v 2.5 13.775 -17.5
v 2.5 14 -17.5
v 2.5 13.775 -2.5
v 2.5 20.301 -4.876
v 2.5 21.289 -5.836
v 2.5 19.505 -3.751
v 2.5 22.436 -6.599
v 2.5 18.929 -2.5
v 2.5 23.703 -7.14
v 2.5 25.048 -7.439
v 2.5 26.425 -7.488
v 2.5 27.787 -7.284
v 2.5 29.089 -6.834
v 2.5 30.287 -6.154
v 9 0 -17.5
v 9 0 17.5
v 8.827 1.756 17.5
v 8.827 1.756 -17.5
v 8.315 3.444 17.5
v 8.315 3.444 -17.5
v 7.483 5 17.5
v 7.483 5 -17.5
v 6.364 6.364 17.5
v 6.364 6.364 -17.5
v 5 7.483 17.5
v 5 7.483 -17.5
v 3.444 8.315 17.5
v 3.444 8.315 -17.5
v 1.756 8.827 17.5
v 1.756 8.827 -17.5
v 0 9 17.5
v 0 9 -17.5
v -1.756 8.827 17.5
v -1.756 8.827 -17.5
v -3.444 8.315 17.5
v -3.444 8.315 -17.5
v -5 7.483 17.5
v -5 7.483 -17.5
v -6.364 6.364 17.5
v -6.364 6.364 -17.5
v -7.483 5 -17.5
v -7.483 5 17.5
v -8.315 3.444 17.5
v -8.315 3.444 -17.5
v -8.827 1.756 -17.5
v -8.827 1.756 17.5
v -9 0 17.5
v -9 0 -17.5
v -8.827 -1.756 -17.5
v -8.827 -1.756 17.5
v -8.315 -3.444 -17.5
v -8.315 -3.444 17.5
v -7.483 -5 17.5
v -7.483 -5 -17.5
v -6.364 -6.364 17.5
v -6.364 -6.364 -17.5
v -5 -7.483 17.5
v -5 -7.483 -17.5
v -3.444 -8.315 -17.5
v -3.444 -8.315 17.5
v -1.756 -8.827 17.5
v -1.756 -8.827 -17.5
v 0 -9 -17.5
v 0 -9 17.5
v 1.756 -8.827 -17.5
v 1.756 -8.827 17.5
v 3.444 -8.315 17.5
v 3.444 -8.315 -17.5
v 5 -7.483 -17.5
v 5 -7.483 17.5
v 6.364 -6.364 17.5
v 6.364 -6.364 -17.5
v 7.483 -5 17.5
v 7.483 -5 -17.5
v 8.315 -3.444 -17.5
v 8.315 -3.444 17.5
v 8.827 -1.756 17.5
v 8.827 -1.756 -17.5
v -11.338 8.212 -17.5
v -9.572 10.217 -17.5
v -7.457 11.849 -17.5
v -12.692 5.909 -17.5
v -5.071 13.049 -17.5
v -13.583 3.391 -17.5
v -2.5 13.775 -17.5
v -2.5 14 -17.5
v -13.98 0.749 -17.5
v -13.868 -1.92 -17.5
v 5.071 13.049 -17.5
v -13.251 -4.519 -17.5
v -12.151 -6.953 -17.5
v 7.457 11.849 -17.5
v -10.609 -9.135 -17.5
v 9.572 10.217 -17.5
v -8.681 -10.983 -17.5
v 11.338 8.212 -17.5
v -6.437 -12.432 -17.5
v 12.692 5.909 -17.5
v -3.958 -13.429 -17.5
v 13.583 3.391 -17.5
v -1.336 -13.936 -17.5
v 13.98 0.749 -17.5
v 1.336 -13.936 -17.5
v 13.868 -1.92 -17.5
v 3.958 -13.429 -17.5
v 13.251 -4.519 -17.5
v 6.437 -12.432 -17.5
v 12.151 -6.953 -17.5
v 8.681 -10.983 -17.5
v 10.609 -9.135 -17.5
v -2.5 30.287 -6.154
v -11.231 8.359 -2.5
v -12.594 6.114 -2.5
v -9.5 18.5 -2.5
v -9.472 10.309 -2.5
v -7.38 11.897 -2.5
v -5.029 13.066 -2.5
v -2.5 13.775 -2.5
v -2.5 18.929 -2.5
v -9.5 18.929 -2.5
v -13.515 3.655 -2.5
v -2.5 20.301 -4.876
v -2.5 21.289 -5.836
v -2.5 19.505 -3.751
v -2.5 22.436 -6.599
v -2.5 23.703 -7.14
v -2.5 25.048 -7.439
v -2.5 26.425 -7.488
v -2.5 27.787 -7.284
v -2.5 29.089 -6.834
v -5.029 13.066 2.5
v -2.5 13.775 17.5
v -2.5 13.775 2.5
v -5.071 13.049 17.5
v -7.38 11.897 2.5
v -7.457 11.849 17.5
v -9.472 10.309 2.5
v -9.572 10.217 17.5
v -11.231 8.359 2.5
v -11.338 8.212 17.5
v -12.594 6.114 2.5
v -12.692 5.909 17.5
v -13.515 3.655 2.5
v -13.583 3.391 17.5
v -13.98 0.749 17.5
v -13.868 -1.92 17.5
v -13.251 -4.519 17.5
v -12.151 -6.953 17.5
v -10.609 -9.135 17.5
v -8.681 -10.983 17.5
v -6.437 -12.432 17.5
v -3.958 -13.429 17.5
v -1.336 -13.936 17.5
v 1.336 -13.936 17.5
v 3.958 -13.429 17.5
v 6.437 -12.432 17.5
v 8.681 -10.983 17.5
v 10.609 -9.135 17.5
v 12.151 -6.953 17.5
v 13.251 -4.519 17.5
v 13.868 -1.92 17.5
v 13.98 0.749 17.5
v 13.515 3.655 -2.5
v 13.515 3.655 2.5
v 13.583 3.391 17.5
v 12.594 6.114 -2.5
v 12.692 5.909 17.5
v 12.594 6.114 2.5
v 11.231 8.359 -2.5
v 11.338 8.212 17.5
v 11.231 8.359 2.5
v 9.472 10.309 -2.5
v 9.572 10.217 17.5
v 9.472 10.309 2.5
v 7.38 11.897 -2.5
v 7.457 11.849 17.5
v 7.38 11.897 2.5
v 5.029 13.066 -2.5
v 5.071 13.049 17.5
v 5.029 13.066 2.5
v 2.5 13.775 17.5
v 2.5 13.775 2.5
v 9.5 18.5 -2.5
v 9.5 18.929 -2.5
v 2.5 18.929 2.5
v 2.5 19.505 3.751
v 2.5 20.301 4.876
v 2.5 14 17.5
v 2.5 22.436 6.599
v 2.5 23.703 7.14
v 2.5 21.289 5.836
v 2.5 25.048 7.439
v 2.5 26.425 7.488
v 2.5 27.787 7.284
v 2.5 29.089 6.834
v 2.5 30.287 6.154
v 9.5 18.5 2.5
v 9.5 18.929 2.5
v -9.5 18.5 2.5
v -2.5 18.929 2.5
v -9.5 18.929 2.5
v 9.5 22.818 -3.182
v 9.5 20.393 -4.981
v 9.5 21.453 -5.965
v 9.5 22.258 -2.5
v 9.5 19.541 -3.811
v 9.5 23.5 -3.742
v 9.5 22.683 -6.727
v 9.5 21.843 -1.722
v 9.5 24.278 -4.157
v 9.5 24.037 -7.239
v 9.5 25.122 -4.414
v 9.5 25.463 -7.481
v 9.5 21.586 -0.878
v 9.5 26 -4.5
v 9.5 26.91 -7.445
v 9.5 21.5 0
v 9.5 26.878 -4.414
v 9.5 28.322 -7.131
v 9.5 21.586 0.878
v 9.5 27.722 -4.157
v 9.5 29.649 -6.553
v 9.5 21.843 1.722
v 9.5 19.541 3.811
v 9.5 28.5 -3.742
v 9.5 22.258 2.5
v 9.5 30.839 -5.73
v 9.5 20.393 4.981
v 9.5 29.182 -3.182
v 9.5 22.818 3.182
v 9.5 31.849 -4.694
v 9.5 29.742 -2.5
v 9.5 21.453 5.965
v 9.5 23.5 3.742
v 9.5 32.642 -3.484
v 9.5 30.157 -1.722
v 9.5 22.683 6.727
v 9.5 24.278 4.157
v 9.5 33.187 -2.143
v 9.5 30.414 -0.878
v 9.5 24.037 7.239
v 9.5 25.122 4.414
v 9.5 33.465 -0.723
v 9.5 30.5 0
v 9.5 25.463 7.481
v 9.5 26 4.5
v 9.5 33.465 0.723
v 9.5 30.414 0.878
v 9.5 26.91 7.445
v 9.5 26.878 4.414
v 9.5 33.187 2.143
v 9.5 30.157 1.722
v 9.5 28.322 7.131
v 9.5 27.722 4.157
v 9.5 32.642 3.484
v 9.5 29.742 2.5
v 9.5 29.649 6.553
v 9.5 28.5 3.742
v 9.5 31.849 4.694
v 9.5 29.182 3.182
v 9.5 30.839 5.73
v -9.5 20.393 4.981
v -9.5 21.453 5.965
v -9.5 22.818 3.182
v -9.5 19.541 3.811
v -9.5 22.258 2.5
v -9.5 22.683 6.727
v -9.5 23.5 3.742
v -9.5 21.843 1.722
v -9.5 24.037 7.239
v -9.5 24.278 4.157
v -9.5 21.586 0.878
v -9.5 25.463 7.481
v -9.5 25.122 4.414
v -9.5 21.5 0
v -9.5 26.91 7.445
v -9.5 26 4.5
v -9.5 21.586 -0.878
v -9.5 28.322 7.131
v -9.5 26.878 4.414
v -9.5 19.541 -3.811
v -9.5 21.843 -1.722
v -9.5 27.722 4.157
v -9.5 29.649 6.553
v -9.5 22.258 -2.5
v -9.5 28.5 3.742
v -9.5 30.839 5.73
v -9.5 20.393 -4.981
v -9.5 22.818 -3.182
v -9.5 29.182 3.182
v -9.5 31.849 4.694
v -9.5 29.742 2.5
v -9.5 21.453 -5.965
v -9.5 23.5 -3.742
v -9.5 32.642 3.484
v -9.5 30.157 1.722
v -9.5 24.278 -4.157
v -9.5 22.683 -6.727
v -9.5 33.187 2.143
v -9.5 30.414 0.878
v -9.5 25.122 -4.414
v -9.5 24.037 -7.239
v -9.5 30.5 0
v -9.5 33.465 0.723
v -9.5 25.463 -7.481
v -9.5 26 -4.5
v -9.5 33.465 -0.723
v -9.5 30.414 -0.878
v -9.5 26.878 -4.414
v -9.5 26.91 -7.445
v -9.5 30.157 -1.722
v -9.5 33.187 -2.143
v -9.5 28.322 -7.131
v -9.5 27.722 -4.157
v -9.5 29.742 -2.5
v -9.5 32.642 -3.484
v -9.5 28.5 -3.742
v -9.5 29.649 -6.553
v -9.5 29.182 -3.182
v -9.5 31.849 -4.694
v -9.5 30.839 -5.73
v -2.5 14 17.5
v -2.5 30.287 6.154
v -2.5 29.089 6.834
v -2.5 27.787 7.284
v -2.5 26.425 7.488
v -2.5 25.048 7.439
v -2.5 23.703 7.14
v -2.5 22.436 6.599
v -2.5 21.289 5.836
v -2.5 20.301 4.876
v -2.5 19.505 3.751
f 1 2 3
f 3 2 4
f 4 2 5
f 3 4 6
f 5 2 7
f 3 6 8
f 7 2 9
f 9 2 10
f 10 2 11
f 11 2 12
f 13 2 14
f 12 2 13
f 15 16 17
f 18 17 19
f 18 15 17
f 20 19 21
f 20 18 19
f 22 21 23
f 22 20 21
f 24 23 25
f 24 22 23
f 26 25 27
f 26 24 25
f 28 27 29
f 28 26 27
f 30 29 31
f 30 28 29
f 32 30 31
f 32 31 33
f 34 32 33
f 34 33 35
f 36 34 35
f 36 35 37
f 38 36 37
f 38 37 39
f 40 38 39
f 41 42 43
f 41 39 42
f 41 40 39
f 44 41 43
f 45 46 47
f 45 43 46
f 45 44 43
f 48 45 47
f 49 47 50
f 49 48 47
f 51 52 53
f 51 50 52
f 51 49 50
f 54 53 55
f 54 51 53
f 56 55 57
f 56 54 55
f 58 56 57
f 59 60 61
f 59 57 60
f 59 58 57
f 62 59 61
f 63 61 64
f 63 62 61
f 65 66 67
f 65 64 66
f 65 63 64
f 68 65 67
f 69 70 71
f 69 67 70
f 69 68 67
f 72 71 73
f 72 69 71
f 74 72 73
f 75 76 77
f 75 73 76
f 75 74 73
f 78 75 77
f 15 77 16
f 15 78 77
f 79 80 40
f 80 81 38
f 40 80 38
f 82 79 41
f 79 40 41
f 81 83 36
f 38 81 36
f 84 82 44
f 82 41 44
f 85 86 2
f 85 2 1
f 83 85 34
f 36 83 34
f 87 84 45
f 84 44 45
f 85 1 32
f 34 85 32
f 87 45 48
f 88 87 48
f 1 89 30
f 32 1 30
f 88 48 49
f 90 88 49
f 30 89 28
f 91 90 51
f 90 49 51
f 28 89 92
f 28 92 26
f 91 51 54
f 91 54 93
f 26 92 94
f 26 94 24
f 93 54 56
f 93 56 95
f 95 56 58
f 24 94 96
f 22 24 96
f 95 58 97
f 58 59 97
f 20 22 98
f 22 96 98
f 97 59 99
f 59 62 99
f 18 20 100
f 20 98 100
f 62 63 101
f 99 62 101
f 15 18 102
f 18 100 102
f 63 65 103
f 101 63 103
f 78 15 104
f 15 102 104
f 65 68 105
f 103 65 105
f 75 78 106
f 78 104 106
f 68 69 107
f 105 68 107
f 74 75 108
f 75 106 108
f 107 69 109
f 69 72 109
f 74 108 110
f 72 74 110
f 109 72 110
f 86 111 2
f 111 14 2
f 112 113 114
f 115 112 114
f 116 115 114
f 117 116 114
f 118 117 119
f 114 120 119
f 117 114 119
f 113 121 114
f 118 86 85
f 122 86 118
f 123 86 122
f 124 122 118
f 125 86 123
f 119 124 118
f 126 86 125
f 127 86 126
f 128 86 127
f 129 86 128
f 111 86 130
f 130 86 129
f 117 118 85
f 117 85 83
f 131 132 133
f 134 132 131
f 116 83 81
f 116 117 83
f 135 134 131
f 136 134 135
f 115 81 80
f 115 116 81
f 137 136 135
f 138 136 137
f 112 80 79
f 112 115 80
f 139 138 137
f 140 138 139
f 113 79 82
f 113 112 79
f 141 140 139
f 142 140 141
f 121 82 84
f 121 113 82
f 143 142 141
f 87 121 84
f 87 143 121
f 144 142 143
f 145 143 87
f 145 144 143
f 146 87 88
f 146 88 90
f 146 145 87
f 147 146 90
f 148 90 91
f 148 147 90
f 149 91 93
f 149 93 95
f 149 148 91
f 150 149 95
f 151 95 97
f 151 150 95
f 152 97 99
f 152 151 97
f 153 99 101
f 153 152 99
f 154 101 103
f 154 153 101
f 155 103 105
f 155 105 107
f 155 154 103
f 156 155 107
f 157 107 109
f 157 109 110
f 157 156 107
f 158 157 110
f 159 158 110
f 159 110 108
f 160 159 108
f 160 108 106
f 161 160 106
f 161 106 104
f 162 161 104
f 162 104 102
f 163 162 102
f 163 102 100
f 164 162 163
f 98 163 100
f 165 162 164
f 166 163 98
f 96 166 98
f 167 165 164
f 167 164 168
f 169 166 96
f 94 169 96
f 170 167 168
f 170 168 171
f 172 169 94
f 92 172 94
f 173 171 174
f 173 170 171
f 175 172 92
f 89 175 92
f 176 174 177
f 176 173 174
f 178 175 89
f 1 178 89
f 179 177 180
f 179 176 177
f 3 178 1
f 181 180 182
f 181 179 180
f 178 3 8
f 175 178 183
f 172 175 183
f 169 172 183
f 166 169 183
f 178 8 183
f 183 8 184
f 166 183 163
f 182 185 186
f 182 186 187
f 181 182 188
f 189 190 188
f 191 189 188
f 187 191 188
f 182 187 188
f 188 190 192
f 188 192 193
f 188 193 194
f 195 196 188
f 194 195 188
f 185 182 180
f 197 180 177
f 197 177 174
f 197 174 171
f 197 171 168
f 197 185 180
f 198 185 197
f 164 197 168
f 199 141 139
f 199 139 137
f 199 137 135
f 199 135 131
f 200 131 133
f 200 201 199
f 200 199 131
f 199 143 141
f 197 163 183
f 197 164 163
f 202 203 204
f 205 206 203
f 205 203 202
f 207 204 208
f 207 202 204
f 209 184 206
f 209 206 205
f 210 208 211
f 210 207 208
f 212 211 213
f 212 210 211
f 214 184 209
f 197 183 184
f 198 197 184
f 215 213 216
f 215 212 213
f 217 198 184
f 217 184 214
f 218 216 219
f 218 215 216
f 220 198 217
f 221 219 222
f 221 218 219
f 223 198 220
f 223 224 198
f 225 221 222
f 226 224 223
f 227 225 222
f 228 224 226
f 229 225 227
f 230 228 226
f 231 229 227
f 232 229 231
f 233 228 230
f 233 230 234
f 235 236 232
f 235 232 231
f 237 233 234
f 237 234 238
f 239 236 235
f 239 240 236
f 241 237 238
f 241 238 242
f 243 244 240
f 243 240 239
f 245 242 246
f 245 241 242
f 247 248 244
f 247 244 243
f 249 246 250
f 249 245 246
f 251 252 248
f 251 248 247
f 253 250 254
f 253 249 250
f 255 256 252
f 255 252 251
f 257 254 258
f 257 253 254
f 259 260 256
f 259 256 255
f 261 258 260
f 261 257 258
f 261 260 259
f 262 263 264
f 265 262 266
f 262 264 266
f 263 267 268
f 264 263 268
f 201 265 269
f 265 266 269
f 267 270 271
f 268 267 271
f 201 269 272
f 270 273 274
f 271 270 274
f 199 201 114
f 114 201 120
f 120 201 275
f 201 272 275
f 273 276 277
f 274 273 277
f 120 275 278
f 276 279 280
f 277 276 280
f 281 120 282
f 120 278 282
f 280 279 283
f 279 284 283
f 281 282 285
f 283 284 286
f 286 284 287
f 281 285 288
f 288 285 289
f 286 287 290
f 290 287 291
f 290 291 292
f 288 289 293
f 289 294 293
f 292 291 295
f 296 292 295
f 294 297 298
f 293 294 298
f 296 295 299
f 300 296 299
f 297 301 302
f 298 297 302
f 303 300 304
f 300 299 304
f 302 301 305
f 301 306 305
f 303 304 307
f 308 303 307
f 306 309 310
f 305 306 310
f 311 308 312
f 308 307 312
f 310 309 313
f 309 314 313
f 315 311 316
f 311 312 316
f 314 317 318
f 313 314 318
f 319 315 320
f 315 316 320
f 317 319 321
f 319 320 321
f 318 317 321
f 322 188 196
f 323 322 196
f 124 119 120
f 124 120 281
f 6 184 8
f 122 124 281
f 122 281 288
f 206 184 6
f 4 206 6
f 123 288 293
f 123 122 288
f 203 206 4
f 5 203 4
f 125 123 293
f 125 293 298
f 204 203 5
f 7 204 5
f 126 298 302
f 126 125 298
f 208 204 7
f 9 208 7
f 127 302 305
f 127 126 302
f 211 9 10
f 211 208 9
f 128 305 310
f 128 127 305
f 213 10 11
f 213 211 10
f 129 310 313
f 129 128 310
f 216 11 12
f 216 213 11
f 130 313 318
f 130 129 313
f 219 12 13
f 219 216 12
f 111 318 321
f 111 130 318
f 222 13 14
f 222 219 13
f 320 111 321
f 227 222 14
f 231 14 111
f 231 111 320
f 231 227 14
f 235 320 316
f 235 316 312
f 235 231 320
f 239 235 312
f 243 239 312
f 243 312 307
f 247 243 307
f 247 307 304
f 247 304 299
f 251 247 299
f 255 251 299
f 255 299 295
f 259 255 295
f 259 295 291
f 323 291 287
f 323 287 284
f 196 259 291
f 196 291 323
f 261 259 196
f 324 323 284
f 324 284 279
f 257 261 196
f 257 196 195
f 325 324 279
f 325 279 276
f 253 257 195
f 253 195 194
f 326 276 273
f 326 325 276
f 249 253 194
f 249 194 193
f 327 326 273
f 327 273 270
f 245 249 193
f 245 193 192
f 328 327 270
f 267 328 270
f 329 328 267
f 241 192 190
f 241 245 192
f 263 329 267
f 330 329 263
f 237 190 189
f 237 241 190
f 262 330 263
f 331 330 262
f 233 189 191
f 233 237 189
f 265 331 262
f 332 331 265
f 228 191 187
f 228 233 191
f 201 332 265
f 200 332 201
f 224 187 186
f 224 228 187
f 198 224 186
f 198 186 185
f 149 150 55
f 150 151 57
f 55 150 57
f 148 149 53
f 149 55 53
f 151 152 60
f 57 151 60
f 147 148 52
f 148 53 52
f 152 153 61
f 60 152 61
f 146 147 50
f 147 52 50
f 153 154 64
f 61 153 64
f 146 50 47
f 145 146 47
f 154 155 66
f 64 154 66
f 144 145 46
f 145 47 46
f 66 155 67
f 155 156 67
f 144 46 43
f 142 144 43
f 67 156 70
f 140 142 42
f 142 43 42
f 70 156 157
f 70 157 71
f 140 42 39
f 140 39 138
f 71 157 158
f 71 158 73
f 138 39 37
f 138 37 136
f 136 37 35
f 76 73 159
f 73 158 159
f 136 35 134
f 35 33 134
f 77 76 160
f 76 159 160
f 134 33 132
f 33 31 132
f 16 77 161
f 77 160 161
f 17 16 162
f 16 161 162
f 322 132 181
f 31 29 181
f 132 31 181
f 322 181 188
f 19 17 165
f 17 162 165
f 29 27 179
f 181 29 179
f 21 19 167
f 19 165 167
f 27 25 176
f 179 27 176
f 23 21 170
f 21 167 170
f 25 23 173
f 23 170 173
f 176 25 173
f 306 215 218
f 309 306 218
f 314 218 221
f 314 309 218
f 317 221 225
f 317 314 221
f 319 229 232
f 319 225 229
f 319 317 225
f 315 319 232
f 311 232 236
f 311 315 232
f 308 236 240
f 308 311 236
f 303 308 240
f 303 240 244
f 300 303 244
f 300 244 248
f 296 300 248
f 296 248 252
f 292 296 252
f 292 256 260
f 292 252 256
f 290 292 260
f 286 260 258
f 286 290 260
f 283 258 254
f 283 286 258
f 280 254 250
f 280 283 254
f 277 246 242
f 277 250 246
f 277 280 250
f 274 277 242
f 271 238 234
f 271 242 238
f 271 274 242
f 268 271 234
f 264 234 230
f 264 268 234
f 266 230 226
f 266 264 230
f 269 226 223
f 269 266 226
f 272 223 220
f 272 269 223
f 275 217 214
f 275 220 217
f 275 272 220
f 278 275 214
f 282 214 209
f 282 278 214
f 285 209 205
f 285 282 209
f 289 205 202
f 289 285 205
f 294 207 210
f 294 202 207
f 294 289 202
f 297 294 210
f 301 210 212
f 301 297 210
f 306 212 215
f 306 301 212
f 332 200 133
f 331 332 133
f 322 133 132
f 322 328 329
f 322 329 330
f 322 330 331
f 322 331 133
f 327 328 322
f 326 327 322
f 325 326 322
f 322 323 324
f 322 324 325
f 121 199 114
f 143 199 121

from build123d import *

# Parameters (mm, degrees)
SKETCH1_R           = 14
SKETCH1_R_2         = 9
BOSS_EXTRUDE1_DEPTH = 17.5
SKETCH7_R           = 7.5
SKETCH7_R_2         = 4.5
BOSS_EXTRUDE5_DEPTH = 9.5
BOSS_EXTRUDE7_DEPTH = 2.5
BOSS_EXTRUDE8_DEPTH = 2.5


with BuildPart() as part:
    # Sketch1 → Boss-Extrude1 (new body, symmetric)
    with BuildSketch(Plane.XY):
        Circle(SKETCH1_R)
        Circle(SKETCH1_R_2, mode=Mode.SUBTRACT)
    extrude(amount=BOSS_EXTRUDE1_DEPTH, both=True)



with BuildPart() as body_2:
    # Sketch7 → Boss-Extrude5 (new body, symmetric)
    with BuildSketch(Plane(origin=(0, 0, 0), x_dir=(0, 0, -1), z_dir=(1, 0, 0))):
        with Locations((0, 26)):
            Circle(SKETCH7_R)
        with Locations((0, 26)):
            Circle(SKETCH7_R_2, mode=Mode.SUBTRACT)
    extrude(amount=BOSS_EXTRUDE5_DEPTH, both=True)


with BuildPart() as part_1:
    add(part.part)

    add(body_2.part)  # Boss-Extrude7 merges body 2
    # Sketch8 → Boss-Extrude7 (add, symmetric)
    with BuildSketch(Plane(origin=(0, 0, 0), x_dir=(0, 0, -1), z_dir=(1, 0, 0))):
        with BuildLine():
            Line((-17.5, 14), (-6.153967777, 30.287036342))
            ThreePointArc((-6.153967777, 30.287036342), (0, 18.5), (6.153967777, 30.287036342))
            Line((6.153967777, 30.287036342), (17.5, 14))
            Line((17.5, 14), (17.5, 9))
            Line((17.5, 9), (-17.5, 9))
            Line((-17.5, 9), (-17.5, 14))
        make_face()
    extrude(amount=BOSS_EXTRUDE7_DEPTH, both=True)

    # Sketch9 → Boss-Extrude8 (add, symmetric)
    with BuildSketch(Plane.XY):
        with BuildLine():
            Line((9.5, 18.5), (9.5, 21.5))
            Line((9.5, 21.5), (-9.5, 21.5))
            Line((-9.5, 21.5), (-9.5, 18.5))
            Line((-9.5, 18.5), (-13.514557534, 3.654686672))
            ThreePointArc((-13.514557534, 3.654686672), (0, 14), (13.514557534, 3.654686672))
            Line((13.514557534, 3.654686672), (9.5, 18.5))
        make_face()
    extrude(amount=BOSS_EXTRUDE8_DEPTH, both=True)


solid = part_1.part
